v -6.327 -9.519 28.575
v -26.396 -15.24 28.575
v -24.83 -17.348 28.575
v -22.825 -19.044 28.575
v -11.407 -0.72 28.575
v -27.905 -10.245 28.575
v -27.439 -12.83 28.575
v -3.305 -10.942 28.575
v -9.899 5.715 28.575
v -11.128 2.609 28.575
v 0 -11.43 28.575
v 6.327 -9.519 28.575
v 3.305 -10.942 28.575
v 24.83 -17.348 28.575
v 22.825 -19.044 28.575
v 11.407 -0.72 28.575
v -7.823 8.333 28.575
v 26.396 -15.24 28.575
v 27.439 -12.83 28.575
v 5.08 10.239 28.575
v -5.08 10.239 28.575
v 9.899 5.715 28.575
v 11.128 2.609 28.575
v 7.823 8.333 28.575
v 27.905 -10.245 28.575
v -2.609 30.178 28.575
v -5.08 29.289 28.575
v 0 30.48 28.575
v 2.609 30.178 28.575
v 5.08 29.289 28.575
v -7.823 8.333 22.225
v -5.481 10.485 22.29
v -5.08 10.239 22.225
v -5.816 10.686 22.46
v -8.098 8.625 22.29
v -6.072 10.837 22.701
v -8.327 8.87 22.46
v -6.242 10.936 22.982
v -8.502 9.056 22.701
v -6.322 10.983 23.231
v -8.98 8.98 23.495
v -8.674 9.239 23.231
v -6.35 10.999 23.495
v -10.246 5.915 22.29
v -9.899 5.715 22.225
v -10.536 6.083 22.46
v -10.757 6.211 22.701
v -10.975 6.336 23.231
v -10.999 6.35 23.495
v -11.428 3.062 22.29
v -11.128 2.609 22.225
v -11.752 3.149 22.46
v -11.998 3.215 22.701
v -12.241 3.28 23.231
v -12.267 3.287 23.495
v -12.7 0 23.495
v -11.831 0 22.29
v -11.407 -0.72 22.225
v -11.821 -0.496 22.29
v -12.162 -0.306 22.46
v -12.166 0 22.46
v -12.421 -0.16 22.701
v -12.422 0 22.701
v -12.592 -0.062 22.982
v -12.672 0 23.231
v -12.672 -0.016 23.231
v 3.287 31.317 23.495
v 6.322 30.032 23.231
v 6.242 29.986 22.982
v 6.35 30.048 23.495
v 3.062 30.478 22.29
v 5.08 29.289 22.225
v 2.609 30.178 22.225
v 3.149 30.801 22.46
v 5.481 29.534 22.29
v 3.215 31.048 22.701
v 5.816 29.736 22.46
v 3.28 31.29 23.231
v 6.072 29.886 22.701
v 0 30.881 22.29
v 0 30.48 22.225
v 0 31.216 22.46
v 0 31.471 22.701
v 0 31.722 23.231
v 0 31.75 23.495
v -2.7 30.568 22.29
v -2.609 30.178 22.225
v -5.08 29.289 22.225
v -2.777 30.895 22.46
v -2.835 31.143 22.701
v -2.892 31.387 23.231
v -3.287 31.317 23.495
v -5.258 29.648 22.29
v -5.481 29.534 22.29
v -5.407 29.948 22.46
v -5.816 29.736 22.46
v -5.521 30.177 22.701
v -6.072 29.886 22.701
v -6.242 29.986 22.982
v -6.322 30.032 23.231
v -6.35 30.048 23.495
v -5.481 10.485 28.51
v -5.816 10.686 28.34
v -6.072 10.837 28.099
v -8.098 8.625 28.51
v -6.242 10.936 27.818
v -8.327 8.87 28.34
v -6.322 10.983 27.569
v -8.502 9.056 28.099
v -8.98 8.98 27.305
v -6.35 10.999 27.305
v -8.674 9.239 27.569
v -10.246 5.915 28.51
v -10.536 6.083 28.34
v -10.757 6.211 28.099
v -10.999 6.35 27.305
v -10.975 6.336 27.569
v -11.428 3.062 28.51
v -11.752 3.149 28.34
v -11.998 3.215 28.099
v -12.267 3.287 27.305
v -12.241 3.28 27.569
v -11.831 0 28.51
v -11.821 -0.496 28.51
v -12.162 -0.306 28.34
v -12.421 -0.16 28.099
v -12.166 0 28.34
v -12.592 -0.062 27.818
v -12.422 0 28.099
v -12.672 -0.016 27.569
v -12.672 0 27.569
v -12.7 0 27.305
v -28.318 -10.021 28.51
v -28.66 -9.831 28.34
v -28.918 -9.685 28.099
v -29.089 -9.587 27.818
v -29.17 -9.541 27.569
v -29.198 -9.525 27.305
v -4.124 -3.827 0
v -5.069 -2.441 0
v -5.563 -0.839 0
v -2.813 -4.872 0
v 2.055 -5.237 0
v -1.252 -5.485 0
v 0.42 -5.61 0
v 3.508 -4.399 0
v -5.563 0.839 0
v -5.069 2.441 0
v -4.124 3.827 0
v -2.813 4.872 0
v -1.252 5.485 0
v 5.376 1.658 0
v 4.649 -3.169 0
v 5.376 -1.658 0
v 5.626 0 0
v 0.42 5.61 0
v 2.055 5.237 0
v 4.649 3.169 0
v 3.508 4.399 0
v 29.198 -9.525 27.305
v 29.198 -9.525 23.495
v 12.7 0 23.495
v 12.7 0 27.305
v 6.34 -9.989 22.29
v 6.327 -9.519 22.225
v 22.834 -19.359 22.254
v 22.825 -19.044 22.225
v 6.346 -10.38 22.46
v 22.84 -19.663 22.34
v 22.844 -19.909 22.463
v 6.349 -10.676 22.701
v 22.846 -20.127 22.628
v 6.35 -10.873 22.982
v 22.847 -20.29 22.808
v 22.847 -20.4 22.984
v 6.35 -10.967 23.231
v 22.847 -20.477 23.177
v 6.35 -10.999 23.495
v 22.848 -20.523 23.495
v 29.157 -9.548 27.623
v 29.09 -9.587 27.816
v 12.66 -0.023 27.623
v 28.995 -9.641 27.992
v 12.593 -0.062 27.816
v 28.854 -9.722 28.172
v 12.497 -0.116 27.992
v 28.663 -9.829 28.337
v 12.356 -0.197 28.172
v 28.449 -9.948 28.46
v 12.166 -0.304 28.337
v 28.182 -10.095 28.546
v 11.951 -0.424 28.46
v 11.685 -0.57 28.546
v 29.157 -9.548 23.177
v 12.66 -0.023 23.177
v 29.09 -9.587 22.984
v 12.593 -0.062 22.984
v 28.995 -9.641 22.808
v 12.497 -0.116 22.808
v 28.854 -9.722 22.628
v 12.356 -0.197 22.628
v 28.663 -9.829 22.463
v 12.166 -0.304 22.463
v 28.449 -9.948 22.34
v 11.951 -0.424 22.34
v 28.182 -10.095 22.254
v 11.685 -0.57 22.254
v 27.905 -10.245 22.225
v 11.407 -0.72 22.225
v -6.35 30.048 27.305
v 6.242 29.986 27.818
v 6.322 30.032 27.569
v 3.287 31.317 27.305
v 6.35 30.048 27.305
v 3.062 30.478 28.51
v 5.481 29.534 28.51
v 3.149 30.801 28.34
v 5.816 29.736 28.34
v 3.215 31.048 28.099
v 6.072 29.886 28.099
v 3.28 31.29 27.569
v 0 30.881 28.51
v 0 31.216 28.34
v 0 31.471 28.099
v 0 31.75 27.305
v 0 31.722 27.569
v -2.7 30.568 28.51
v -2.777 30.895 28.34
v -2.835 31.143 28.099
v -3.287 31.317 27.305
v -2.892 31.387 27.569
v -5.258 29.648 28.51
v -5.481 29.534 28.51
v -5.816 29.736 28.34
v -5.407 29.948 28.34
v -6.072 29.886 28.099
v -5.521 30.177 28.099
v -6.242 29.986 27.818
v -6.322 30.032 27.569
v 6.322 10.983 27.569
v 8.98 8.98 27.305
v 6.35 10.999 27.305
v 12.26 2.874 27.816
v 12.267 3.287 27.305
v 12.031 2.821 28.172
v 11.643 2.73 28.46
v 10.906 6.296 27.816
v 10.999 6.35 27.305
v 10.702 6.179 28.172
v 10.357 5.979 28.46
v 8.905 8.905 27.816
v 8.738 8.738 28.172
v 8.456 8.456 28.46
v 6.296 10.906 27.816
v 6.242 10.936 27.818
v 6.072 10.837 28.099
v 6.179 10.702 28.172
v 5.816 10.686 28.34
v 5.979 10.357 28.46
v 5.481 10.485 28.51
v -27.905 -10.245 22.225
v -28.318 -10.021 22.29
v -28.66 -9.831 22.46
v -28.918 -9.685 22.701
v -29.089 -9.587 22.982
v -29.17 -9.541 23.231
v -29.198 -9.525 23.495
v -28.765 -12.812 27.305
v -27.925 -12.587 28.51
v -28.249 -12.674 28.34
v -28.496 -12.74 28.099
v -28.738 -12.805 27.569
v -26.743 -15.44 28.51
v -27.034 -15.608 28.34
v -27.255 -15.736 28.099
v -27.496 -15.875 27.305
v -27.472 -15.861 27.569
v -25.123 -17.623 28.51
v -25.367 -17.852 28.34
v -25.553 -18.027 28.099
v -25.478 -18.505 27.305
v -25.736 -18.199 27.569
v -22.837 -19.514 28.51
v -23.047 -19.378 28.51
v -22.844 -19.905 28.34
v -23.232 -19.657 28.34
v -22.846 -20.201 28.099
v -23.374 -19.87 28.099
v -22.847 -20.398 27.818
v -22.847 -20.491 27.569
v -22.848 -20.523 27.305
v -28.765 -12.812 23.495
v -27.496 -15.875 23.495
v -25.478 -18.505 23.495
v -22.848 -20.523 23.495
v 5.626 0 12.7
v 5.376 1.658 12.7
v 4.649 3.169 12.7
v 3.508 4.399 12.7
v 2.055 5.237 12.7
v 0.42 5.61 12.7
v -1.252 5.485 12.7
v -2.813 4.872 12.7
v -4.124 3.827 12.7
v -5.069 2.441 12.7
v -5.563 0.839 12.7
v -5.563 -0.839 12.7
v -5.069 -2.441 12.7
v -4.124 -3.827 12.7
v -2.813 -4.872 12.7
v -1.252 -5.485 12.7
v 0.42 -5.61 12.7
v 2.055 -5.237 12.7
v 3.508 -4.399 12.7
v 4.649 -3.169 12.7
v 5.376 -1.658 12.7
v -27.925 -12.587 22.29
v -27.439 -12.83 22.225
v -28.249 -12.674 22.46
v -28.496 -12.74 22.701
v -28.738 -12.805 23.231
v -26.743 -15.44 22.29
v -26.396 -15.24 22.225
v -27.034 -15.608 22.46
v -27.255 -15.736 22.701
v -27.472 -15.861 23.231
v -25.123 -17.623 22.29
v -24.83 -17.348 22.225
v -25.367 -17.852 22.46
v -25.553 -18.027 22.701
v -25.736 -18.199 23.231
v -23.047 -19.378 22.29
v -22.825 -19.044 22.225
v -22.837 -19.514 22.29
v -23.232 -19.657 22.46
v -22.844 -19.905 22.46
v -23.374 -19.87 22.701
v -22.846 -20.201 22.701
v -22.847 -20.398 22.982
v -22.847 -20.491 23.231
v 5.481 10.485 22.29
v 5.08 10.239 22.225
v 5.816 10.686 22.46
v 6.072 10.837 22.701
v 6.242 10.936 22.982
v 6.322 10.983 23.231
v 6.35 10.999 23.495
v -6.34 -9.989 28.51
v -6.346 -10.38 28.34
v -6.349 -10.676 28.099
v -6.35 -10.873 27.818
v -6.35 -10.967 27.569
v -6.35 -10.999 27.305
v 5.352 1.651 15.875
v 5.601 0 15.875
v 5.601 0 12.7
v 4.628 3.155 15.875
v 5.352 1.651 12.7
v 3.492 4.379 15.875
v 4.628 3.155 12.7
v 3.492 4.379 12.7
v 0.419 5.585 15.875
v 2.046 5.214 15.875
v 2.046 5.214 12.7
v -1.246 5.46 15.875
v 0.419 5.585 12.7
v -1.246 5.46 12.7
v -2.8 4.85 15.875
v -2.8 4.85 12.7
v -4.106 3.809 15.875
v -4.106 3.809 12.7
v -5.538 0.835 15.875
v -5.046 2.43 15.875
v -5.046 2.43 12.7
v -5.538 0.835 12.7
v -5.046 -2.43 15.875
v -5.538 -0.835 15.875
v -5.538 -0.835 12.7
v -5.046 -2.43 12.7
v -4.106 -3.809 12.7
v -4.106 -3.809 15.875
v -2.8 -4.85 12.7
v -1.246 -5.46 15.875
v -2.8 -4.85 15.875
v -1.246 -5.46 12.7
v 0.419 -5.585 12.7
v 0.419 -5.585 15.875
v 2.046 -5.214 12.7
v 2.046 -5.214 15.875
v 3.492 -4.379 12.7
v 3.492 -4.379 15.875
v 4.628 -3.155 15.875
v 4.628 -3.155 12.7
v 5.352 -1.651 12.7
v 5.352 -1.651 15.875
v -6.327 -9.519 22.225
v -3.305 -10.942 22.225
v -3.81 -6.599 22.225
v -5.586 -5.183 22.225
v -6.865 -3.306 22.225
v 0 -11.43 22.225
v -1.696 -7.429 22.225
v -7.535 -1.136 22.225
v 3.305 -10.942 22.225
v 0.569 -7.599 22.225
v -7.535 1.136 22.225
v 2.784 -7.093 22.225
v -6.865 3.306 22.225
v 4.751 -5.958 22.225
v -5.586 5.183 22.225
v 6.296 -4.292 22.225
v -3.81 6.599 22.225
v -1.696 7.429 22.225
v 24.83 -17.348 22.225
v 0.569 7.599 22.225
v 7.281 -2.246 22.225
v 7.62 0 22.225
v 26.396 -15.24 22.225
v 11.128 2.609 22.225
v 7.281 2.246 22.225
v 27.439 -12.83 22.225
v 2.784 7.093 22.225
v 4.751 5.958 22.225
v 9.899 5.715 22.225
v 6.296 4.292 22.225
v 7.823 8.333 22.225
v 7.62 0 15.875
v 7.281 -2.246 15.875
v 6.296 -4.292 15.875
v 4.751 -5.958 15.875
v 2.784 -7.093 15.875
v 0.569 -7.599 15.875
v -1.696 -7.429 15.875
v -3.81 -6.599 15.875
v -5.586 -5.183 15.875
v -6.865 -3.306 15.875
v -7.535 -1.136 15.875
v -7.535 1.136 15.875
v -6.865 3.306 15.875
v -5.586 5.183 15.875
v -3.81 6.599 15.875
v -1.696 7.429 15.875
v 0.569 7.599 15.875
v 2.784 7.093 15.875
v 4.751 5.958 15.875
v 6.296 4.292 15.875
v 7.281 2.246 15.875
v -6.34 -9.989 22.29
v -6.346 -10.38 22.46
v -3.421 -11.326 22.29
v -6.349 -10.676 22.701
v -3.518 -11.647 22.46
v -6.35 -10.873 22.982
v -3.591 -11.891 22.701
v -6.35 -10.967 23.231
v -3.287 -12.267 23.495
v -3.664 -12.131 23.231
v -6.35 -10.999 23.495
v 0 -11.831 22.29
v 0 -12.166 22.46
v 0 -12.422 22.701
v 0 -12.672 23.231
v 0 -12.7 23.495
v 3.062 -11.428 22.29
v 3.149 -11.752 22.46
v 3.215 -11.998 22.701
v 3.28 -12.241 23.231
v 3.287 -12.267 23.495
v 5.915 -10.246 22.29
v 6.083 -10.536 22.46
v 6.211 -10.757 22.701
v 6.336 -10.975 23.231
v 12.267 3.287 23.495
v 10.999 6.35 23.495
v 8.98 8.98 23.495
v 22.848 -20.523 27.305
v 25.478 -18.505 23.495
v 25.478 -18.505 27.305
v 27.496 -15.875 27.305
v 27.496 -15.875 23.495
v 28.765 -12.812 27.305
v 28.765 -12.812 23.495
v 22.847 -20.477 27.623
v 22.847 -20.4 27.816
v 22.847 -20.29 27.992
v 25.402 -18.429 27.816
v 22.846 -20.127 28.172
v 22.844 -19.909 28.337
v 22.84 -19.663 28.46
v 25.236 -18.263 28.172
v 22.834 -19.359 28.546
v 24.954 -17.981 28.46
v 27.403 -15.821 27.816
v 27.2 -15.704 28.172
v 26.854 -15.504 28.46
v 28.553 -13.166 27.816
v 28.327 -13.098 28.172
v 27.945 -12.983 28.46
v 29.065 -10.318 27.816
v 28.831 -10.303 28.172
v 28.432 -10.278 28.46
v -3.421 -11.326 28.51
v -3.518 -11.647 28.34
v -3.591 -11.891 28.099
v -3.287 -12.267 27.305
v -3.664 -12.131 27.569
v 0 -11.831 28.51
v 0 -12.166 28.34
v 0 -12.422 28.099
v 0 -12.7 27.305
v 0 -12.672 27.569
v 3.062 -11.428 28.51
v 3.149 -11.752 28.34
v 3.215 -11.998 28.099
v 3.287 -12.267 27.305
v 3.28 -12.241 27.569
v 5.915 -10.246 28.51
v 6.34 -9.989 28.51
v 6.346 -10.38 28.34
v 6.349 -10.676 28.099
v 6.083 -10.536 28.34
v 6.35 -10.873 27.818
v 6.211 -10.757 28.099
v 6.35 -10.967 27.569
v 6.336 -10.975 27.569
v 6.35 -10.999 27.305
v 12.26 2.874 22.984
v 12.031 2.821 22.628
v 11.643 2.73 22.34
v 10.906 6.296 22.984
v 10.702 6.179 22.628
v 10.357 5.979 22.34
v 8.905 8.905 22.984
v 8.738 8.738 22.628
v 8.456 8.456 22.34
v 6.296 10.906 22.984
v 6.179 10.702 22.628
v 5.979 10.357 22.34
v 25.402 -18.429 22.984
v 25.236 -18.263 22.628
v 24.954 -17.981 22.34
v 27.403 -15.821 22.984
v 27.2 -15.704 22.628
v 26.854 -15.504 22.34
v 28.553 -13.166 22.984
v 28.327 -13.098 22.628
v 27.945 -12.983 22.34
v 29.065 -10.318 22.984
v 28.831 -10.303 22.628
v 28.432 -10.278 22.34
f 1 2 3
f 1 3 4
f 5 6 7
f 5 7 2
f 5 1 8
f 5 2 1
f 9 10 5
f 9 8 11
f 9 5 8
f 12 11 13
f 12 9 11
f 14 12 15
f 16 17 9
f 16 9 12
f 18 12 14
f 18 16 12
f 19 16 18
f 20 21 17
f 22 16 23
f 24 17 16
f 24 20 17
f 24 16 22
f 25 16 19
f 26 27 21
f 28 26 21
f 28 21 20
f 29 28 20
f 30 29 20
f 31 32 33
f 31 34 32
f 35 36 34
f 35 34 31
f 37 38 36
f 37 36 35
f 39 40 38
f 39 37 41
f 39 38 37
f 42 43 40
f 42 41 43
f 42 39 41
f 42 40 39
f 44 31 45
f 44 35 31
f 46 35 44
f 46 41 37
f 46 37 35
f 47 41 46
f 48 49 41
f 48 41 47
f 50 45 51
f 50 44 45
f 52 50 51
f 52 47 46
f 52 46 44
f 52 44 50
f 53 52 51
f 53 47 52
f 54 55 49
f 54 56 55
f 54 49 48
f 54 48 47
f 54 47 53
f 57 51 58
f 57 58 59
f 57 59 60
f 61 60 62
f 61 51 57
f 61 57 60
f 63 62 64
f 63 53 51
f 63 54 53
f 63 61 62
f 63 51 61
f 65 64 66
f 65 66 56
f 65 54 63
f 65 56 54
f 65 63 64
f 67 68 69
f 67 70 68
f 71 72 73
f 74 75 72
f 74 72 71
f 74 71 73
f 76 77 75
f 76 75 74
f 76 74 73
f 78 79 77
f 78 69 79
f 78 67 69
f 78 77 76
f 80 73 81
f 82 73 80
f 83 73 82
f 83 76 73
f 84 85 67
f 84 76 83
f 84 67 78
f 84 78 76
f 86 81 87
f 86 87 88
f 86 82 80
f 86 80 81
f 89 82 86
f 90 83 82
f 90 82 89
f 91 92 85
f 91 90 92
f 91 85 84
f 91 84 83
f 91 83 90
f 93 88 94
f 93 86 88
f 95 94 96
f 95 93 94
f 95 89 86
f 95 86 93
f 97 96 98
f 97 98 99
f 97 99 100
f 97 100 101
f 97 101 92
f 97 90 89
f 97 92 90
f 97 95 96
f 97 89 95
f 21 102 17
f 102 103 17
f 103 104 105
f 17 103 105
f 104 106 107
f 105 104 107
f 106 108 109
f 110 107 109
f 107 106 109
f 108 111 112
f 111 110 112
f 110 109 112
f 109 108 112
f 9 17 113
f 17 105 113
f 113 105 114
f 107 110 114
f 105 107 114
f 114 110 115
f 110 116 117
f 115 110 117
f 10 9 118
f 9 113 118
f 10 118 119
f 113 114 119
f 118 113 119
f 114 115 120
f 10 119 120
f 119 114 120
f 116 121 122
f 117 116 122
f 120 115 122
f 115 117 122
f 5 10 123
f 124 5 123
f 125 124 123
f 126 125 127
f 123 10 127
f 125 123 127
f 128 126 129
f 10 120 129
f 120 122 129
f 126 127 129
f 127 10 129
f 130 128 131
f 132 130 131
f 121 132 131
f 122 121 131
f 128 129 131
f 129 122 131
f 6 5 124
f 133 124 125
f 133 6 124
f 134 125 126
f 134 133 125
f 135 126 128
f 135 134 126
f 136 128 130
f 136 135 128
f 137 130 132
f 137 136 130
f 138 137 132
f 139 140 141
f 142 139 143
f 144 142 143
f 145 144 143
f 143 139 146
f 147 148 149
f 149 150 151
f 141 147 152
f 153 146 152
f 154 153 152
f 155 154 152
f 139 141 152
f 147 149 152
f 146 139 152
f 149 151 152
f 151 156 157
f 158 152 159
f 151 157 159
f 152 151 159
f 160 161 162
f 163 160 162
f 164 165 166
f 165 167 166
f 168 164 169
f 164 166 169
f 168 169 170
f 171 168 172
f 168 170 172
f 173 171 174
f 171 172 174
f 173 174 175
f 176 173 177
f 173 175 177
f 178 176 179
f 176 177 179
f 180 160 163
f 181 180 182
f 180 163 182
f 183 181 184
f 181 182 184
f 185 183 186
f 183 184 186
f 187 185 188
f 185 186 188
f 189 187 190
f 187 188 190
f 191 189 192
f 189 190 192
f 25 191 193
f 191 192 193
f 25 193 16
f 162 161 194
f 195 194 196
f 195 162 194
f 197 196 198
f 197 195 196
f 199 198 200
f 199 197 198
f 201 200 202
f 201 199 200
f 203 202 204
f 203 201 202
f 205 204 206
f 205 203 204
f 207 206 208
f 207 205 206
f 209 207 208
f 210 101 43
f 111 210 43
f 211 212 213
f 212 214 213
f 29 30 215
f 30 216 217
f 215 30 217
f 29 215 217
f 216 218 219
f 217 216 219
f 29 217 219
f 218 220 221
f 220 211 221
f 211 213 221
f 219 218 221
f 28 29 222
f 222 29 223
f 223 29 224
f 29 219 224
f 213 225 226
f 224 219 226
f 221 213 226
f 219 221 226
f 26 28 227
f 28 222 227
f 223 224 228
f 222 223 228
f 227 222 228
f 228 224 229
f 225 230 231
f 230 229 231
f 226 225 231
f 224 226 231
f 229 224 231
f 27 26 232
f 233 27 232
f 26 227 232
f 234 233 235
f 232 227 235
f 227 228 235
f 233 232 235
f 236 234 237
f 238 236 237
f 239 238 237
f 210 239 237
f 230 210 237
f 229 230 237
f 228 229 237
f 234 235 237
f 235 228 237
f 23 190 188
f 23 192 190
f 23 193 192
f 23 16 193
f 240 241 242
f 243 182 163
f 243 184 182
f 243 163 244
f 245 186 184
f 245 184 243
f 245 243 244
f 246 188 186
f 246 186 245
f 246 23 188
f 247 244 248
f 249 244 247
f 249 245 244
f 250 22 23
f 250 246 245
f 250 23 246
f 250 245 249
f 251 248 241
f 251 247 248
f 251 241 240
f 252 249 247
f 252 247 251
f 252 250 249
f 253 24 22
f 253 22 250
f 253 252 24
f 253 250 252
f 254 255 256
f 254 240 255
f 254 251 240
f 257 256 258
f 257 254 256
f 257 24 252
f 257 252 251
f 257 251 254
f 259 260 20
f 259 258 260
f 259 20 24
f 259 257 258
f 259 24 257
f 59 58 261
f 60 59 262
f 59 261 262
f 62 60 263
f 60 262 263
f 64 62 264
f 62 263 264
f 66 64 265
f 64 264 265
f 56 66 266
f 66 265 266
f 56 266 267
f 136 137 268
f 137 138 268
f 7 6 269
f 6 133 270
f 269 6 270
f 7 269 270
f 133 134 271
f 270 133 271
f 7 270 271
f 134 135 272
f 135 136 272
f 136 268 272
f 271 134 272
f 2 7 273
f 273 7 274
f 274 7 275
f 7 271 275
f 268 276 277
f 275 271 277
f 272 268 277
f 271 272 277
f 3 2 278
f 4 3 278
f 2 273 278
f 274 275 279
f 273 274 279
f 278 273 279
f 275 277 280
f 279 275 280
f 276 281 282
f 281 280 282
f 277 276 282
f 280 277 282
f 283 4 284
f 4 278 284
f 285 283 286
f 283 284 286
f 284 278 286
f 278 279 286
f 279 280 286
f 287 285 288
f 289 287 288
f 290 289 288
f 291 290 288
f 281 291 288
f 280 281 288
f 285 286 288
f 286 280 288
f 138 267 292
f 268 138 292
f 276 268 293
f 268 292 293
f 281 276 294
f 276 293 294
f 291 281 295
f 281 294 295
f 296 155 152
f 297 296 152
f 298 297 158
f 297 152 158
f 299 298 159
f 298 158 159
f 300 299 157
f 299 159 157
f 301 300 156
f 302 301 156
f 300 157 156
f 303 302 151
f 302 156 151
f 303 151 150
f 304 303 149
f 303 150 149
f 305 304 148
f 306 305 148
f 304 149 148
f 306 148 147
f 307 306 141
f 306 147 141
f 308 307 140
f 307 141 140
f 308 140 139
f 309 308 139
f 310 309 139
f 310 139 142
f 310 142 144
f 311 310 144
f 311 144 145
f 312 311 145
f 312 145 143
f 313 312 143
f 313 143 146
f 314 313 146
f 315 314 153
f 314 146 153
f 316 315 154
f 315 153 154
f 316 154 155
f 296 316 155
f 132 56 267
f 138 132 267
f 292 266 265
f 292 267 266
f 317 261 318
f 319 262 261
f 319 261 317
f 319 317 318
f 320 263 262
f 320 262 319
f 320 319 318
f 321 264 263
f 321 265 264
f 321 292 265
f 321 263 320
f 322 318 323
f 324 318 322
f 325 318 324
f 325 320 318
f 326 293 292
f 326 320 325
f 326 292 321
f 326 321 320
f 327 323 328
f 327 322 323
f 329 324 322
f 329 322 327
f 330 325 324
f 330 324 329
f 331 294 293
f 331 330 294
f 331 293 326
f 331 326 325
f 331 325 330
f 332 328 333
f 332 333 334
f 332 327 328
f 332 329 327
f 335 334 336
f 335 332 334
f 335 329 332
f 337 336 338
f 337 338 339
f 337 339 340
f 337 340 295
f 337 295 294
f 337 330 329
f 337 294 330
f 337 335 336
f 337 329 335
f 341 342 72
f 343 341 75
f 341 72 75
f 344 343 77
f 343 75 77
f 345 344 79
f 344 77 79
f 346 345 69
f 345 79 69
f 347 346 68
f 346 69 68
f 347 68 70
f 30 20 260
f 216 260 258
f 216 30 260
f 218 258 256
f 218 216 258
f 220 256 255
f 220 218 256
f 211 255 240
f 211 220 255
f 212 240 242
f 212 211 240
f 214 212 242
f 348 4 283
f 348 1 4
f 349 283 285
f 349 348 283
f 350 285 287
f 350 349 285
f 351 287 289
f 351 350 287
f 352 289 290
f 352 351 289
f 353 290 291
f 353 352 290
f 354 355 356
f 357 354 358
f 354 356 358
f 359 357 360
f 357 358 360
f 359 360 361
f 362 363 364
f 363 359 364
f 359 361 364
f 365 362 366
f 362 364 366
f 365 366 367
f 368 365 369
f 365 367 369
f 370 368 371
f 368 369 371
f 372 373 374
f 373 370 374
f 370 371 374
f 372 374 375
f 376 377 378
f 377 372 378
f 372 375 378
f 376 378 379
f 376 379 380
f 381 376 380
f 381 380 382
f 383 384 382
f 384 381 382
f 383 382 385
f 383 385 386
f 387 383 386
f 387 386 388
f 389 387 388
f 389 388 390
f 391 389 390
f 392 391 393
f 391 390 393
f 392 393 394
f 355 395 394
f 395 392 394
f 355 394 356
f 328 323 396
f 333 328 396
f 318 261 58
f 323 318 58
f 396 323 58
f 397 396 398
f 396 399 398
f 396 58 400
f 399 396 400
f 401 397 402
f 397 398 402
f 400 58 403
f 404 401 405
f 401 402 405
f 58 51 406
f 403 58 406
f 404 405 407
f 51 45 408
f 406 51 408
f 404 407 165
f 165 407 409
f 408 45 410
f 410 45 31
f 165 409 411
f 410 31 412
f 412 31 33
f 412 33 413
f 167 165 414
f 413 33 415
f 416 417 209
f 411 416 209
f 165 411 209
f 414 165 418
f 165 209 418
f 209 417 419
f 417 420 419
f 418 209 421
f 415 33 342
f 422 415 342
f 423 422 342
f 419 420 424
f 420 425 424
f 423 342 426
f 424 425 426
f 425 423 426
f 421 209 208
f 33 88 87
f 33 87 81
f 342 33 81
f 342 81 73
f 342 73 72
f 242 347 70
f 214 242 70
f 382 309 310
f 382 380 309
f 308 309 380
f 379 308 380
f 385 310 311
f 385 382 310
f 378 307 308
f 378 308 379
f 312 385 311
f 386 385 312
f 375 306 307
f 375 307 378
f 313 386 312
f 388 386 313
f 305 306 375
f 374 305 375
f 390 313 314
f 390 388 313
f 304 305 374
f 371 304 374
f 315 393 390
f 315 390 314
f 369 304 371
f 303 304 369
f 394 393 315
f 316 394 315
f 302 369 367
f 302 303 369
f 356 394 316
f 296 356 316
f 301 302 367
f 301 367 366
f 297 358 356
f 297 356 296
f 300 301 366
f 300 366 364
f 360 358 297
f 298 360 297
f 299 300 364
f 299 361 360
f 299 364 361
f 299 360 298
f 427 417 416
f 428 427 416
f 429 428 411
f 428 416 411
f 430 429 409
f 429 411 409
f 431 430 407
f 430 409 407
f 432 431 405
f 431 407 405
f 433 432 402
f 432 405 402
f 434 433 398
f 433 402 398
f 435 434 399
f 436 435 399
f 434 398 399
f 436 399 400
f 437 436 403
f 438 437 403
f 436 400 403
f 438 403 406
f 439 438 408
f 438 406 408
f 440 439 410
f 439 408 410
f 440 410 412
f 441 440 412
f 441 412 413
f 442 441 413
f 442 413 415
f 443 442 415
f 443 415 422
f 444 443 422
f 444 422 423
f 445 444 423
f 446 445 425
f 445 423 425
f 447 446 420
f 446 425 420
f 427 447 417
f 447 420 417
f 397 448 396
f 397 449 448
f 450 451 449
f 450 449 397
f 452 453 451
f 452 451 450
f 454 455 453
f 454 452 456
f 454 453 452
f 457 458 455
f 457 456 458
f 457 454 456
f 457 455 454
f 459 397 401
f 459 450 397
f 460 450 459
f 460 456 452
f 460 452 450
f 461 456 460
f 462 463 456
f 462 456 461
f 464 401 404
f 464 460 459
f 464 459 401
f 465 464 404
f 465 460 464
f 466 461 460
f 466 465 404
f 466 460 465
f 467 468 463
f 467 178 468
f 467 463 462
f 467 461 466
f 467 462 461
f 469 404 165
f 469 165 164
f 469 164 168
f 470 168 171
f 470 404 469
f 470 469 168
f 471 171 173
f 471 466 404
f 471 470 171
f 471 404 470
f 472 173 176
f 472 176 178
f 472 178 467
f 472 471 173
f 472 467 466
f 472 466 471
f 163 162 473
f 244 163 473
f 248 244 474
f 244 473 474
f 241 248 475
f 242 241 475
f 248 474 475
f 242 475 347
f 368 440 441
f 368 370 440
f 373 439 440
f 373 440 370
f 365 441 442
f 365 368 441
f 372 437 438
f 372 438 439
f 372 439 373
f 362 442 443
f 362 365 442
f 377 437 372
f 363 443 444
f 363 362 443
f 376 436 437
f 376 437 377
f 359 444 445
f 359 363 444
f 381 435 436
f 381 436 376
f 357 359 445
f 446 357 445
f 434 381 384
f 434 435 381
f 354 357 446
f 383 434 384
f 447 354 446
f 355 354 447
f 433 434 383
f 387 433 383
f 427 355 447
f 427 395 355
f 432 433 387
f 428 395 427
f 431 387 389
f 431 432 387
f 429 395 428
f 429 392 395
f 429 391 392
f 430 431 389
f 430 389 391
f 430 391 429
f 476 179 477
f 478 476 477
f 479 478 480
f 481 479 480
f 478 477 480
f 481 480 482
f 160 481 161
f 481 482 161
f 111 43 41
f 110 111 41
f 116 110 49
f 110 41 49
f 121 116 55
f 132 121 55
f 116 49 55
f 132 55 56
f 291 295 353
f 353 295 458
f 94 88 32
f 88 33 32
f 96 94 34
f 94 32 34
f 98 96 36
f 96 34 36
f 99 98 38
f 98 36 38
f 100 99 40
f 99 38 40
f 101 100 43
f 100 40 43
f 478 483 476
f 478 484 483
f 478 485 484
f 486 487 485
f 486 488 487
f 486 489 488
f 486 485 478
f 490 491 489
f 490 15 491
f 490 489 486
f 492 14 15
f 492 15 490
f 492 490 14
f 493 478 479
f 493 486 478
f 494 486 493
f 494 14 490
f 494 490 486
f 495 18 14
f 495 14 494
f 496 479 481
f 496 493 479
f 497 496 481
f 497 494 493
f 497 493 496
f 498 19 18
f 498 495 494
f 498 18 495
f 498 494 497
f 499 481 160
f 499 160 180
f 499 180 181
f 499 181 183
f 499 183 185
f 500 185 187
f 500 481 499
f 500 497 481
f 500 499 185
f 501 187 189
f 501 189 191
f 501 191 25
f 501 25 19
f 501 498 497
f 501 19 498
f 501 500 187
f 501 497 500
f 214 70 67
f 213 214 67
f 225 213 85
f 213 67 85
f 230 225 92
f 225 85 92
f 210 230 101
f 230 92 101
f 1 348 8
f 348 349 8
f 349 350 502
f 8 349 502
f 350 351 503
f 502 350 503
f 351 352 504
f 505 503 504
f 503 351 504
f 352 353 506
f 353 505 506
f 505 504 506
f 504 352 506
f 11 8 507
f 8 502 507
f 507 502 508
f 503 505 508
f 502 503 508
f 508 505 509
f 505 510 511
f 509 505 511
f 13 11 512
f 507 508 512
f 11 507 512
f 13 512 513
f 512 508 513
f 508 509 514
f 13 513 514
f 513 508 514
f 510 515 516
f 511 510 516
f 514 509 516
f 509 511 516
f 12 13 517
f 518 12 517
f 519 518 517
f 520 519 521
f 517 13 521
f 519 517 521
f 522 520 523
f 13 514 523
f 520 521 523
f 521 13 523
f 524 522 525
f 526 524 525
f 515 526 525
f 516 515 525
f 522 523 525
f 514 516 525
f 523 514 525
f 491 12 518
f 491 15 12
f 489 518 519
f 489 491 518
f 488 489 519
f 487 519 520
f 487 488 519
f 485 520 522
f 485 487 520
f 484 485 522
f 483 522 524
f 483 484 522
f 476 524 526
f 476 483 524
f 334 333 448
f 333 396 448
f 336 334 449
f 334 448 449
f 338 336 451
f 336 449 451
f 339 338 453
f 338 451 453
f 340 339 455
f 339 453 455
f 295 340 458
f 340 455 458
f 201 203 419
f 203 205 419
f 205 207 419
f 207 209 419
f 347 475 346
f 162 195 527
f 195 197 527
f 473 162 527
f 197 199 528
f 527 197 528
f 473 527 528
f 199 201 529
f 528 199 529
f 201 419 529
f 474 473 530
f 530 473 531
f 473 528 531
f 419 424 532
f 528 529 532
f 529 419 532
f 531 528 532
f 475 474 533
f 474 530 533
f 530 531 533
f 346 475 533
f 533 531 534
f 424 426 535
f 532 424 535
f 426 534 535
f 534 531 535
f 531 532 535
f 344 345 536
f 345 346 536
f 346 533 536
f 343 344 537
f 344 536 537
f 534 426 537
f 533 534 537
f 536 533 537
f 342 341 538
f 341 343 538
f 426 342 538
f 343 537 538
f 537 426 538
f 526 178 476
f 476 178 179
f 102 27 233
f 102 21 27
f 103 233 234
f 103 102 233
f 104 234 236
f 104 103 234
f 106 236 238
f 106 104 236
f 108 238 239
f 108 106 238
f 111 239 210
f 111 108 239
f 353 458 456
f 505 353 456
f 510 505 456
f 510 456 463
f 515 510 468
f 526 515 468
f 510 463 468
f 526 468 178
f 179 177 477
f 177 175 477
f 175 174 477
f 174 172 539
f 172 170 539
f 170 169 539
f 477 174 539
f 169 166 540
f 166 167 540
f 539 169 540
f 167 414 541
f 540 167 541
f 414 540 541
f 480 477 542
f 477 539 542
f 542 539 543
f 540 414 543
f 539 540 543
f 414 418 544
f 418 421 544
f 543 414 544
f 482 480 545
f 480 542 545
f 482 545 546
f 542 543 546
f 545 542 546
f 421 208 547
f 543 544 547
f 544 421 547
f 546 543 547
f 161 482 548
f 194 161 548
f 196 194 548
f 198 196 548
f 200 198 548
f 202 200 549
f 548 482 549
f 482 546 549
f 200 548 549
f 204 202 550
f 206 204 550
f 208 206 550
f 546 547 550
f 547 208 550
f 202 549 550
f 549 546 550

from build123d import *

# Parameters (mm, degrees)
F0_R      = 5.6261
F1_DEPTH  = 12.7
F2_R      = 5.6007
F3_DEPTH  = 9.525
F4_R      = 12.7
F4_R_2    = 5.6007
F6_DEPTH  = 6.35
F7_DEPTH  = 6.35
F8_R      = 7.62
F9_DEPTH  = 6.35
F10_DEPTH = 6.35
F11_R     = 1.27


with BuildPart() as f1:
    # F0 (on Top) → F1 (new body)
    with BuildSketch(Plane.XY):
        Circle(F0_R)
    extrude(amount=F1_DEPTH)

    # F2 (on face) → F3 (join)
    with BuildSketch(Plane.XY.offset(12.7)):
        Circle(F2_R)
    extrude(amount=F3_DEPTH)

    # F4 (on face) → F6 (join)
    with BuildSketch(Plane.XY.offset(22.225)):
        Circle(F4_R)
        Circle(F4_R_2, mode=Mode.SUBTRACT)
    extrude(amount=F6_DEPTH)

    # F7 (add): a face of the model
    f7_faces = [f1.faces().sort_by_distance(p)[0] for p in [
        (0, 0, 22.225),
    ]]
    extrude(f7_faces, amount=F7_DEPTH)

    # F8 (on face) → F9 (join)
    with BuildSketch(Plane(origin=(0, 0, 22.225), x_dir=(1, 0, 0), z_dir=(0, 0, -1))):
        Circle(F8_R)
    extrude(amount=F9_DEPTH)

    # F5 (on face) → F10 (join)
    with BuildSketch(Plane.XY.offset(22.225)):
        with BuildLine():
            ThreePointArc((-6.35, -10.9985226281), (-10.9985226281, -6.35), (-12.7, 0))
            Line((-12.7, 0), (-29.197504538, -9.524838686))
            ThreePointArc((-29.197504538, -9.524838686), (-27.4960271661, -15.874838686), (-22.847504538, -20.523361314))
            Line((-22.847504538, -20.523361314), (-6.35, -10.9985226281))
        make_face()
        with BuildLine():
            Line((-6.35, 30.0482), (-6.35, 10.9985226281))
            ThreePointArc((-6.35, 10.9985226281), (0, 12.7), (6.35, 10.9985226281))
            Line((6.35, 10.9985226281), (6.35, 30.0482))
            ThreePointArc((6.35, 30.0482), (0, 31.7496773719), (-6.35, 30.0482))
        make_face()
        with BuildLine():
            Line((29.197504538, -9.524838686), (12.7, 0))
            ThreePointArc((12.7, 0), (10.9985226281, -6.35), (6.35, -10.9985226281))
            Line((6.35, -10.9985226281), (22.847504538, -20.523361314))
            ThreePointArc((22.847504538, -20.523361314), (27.4960271661, -15.874838686), (29.197504538, -9.524838686))
        make_face()
    extrude(amount=F10_DEPTH)

    # F11
    f11_edges = [f1.edges().sort_by_distance(p)[0] for p in [
        (6.35, 20.523361, 28.575),
        (20.948752, -4.762419, 28.575),
        (27.496027, -15.874839, 28.575),
        (14.598752, -15.760942, 28.575),
        (0, 31.749677, 28.575),
        (-6.35, 20.523361, 28.575),
        (-20.948752, -4.762419, 28.575),
        (-14.598752, -15.760942, 28.575),
        (-27.496027, -15.874839, 28.575),
        (-27.496027, -15.874839, 22.225),
        (-20.948752, -4.762419, 22.225),
        (-6.35, 20.523361, 22.225),
        (0, 31.749677, 22.225),
        (6.35, 20.523361, 22.225),
        (20.948752, -4.762419, 22.225),
        (27.496027, -15.874839, 22.225),
        (14.598752, -15.760942, 22.225),
        (-14.598752, -15.760942, 22.225),
        (-10.998523, 6.35, 22.225),
        (0, -12.7, 22.225),
        (10.998523, 6.35, 22.225),
        (10.998523, 6.35, 28.575),
        (-10.998523, 6.35, 28.575),
        (0, -12.7, 28.575),
    ]]
    fillet(f11_edges, radius=F11_R)


solid = f1.part
